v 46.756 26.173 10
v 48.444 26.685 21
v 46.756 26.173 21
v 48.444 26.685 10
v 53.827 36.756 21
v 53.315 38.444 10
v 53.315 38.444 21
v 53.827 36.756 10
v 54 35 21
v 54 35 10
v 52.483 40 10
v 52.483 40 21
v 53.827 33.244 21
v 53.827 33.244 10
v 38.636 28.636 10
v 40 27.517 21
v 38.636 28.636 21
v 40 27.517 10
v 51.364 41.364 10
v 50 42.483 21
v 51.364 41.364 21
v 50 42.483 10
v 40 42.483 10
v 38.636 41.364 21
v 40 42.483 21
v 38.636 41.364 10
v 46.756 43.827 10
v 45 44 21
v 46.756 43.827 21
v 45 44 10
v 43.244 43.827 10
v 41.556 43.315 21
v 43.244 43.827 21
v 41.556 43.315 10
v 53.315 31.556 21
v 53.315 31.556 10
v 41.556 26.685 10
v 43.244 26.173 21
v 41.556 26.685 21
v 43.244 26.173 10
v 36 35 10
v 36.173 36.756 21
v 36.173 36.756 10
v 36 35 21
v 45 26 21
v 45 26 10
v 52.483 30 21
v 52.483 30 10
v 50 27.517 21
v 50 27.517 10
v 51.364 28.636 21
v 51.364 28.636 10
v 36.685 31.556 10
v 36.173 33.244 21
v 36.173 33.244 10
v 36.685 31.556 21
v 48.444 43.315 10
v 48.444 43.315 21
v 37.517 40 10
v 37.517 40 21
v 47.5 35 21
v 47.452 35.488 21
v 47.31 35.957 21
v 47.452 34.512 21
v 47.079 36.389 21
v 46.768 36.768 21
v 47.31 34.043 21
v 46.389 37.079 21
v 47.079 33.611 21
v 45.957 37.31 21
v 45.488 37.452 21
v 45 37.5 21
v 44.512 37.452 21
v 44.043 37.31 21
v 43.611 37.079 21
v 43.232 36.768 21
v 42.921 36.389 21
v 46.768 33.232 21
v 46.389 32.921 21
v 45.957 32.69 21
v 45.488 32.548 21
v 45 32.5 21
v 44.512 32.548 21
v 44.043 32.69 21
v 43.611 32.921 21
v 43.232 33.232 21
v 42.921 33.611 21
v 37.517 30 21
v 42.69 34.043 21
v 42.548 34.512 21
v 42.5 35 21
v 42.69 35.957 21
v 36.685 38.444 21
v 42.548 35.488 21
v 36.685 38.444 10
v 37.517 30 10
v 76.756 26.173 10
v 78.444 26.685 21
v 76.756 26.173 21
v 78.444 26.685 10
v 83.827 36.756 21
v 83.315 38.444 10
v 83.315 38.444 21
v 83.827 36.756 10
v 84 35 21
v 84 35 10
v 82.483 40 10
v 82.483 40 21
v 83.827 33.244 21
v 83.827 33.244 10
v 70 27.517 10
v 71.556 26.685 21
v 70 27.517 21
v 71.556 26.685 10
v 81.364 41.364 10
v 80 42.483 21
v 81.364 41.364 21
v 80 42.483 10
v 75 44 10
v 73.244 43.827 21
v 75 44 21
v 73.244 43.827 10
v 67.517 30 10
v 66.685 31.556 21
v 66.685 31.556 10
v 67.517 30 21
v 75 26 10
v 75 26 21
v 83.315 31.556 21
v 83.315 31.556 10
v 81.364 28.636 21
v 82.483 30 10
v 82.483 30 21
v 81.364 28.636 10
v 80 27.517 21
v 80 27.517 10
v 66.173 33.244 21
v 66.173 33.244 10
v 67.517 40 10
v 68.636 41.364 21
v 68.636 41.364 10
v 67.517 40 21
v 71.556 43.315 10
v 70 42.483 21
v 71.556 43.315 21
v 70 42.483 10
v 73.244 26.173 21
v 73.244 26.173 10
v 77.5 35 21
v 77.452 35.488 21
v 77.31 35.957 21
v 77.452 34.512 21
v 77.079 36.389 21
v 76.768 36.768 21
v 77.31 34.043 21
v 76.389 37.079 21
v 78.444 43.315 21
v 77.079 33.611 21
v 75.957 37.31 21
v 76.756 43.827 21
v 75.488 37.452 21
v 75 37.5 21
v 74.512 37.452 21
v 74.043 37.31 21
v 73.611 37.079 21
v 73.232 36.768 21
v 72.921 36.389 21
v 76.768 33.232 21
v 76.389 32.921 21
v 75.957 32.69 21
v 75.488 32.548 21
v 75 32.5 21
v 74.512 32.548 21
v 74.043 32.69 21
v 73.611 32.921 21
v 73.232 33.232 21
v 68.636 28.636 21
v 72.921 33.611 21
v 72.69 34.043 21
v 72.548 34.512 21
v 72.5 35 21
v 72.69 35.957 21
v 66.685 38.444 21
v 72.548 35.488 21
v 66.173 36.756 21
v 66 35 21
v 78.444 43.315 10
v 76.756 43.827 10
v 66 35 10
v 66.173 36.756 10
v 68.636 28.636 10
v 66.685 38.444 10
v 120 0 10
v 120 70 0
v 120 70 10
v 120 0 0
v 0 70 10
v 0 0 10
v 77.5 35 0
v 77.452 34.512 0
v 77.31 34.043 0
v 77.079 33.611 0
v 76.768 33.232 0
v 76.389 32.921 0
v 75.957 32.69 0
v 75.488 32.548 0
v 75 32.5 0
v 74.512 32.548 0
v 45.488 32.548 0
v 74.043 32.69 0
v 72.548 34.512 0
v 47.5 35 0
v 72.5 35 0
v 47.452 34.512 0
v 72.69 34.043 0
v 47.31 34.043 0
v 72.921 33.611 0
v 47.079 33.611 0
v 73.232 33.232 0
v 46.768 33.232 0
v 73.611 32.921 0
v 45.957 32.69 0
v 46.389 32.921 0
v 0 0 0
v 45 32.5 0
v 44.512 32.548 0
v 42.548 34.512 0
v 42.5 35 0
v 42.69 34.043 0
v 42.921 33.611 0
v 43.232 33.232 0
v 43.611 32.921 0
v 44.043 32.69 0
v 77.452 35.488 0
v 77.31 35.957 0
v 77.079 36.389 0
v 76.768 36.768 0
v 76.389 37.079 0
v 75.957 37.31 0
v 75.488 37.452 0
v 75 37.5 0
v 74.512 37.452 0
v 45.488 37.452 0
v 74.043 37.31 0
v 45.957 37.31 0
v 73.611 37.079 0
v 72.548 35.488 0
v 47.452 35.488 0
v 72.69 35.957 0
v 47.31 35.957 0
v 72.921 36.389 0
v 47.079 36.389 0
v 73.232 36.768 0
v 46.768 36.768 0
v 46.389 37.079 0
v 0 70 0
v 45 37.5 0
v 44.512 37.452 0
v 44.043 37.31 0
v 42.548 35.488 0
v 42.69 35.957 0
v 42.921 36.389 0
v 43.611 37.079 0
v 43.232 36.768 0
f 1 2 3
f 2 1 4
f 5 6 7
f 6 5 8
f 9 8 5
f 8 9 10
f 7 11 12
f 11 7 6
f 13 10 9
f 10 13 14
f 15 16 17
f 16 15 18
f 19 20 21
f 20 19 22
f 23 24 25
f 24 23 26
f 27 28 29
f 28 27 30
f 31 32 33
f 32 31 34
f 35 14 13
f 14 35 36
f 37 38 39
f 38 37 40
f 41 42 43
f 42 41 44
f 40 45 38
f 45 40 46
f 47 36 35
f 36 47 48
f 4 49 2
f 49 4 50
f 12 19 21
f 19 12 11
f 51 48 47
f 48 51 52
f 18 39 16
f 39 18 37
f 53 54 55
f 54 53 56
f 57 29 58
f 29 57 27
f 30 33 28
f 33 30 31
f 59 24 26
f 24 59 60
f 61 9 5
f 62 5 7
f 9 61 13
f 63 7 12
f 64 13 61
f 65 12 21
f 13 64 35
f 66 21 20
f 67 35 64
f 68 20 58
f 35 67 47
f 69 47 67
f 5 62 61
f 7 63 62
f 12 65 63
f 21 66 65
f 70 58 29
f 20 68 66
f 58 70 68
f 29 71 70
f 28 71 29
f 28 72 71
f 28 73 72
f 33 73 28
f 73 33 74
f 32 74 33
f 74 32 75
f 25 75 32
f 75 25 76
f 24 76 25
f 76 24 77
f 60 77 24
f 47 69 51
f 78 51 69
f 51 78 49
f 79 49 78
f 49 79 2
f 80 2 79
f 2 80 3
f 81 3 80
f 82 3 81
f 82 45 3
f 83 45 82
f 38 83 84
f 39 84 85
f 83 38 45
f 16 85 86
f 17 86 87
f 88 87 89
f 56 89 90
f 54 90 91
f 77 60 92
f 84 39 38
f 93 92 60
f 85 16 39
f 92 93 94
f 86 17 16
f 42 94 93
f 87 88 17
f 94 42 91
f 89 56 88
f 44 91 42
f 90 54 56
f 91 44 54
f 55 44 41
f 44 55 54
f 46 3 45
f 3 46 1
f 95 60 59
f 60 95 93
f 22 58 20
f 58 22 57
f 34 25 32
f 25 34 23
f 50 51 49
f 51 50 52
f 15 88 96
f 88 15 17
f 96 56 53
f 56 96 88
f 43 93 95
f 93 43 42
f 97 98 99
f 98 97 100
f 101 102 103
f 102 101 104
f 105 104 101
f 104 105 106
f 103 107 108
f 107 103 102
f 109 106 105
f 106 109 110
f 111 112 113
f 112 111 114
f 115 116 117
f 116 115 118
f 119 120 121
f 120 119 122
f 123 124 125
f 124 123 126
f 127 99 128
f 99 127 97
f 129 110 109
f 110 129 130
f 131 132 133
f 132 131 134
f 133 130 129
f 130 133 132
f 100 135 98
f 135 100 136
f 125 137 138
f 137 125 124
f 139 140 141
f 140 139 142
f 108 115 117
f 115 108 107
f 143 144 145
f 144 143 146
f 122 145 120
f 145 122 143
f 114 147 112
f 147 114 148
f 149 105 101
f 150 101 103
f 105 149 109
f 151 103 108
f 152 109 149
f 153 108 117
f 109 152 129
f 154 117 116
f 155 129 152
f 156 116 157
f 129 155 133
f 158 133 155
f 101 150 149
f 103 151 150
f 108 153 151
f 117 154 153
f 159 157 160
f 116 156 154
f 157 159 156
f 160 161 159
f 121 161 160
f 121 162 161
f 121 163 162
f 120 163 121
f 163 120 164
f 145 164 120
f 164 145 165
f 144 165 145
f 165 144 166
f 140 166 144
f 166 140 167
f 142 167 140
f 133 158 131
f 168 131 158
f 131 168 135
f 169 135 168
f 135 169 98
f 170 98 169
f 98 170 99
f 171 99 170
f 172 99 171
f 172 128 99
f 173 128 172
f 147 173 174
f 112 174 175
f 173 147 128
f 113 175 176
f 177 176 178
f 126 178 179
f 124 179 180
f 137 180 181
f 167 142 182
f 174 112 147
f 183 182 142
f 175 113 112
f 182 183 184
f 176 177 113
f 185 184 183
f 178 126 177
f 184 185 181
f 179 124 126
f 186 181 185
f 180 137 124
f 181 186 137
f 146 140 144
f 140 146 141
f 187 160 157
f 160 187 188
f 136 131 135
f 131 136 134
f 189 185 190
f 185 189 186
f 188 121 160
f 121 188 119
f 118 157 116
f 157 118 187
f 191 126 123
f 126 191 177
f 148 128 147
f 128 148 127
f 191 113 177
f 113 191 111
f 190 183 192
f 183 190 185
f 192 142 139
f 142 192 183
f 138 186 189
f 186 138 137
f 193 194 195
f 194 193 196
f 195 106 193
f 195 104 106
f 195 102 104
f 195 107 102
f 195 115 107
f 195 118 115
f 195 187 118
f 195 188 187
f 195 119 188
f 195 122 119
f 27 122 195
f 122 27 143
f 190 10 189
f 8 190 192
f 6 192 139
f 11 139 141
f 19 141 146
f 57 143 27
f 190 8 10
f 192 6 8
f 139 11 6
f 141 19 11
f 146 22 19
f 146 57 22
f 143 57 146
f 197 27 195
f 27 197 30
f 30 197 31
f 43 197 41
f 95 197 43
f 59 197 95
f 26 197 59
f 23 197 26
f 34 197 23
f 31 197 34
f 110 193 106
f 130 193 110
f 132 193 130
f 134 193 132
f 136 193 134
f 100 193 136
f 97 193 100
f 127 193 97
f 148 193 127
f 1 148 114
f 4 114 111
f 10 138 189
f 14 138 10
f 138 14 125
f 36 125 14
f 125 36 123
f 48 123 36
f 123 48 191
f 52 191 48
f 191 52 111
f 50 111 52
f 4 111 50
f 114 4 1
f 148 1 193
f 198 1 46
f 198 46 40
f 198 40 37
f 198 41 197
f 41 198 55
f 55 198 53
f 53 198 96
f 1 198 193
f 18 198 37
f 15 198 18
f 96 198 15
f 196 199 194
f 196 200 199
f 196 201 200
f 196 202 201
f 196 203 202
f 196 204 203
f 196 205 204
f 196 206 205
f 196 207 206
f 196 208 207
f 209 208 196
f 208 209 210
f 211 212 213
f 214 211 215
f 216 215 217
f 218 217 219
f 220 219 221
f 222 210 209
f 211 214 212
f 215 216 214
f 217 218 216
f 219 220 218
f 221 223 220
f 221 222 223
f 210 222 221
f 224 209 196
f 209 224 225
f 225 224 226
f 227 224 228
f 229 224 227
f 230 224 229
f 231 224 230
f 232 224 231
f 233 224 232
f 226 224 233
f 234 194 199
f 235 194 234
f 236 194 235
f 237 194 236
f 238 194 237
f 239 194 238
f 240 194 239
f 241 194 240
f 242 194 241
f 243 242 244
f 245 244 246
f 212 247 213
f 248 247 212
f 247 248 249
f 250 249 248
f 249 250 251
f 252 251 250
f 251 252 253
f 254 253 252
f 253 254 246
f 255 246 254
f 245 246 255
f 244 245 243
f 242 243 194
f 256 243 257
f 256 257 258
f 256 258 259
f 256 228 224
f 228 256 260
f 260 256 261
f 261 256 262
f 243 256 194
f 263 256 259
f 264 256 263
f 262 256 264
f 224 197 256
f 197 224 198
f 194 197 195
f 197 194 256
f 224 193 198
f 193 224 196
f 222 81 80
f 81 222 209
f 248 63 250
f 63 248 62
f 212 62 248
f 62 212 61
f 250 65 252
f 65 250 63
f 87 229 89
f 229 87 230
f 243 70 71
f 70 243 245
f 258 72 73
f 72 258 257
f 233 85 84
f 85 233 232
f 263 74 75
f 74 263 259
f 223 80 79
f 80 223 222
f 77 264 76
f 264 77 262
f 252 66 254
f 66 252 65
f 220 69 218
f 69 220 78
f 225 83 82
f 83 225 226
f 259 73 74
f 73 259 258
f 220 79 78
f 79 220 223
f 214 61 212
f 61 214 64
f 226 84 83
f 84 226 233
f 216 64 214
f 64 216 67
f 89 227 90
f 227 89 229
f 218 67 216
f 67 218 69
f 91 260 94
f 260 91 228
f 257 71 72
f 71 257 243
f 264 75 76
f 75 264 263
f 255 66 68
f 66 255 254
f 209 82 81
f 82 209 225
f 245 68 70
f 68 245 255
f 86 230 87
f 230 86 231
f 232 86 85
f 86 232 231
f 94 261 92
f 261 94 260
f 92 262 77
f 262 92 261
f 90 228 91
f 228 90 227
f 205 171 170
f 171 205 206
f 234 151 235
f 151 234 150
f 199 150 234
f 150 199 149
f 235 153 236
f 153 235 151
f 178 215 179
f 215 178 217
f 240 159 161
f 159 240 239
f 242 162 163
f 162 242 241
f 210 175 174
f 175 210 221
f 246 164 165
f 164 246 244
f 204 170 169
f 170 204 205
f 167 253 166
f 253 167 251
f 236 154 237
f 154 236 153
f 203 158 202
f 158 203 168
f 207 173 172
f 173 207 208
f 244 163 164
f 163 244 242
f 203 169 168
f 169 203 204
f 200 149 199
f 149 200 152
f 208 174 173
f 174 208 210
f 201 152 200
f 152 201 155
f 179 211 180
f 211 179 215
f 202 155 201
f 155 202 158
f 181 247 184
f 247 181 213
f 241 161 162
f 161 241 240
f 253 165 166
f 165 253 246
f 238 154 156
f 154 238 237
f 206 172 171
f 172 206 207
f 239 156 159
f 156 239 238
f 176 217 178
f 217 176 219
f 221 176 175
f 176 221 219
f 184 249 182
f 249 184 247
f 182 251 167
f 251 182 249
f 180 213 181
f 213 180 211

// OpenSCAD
$fn = 32;

// ----------------------------------------------------------------------
// Drill jig: two_boss jig
// ----------------------------------------------------------------------

// --- parameters (mm) ---
plate_l = 120;            // plate length, X
plate_w = 70;             // plate width, Y
plate_t = 10;             // plate thickness
boss_d = 18;              // guide boss diameter
boss_h = 12;              // boss height above the plate
guide_d = 5;              // guide hole diameter
boss_pitch = 30;          // boss pitch

n_boss = 2;  // guide bosses
boss_x0 = (plate_l - (n_boss - 1) * boss_pitch) / 2;  // first boss X
boss_top = plate_t - 1 + boss_h;  // boss crown height
total_h = boss_top;  // overall height

difference() {
  union() {
  cube([plate_l, plate_w, plate_t]);
  for (i = [0 : n_boss - 1])
    translate([boss_x0 + i * boss_pitch, plate_w / 2, plate_t - 1])
      cylinder(h = boss_h, d = boss_d);
  }
  for (i = [0 : n_boss - 1])
    translate([boss_x0 + i * boss_pitch, plate_w / 2, -1])
      cylinder(h = plate_t + boss_h, d = guide_d);
}
